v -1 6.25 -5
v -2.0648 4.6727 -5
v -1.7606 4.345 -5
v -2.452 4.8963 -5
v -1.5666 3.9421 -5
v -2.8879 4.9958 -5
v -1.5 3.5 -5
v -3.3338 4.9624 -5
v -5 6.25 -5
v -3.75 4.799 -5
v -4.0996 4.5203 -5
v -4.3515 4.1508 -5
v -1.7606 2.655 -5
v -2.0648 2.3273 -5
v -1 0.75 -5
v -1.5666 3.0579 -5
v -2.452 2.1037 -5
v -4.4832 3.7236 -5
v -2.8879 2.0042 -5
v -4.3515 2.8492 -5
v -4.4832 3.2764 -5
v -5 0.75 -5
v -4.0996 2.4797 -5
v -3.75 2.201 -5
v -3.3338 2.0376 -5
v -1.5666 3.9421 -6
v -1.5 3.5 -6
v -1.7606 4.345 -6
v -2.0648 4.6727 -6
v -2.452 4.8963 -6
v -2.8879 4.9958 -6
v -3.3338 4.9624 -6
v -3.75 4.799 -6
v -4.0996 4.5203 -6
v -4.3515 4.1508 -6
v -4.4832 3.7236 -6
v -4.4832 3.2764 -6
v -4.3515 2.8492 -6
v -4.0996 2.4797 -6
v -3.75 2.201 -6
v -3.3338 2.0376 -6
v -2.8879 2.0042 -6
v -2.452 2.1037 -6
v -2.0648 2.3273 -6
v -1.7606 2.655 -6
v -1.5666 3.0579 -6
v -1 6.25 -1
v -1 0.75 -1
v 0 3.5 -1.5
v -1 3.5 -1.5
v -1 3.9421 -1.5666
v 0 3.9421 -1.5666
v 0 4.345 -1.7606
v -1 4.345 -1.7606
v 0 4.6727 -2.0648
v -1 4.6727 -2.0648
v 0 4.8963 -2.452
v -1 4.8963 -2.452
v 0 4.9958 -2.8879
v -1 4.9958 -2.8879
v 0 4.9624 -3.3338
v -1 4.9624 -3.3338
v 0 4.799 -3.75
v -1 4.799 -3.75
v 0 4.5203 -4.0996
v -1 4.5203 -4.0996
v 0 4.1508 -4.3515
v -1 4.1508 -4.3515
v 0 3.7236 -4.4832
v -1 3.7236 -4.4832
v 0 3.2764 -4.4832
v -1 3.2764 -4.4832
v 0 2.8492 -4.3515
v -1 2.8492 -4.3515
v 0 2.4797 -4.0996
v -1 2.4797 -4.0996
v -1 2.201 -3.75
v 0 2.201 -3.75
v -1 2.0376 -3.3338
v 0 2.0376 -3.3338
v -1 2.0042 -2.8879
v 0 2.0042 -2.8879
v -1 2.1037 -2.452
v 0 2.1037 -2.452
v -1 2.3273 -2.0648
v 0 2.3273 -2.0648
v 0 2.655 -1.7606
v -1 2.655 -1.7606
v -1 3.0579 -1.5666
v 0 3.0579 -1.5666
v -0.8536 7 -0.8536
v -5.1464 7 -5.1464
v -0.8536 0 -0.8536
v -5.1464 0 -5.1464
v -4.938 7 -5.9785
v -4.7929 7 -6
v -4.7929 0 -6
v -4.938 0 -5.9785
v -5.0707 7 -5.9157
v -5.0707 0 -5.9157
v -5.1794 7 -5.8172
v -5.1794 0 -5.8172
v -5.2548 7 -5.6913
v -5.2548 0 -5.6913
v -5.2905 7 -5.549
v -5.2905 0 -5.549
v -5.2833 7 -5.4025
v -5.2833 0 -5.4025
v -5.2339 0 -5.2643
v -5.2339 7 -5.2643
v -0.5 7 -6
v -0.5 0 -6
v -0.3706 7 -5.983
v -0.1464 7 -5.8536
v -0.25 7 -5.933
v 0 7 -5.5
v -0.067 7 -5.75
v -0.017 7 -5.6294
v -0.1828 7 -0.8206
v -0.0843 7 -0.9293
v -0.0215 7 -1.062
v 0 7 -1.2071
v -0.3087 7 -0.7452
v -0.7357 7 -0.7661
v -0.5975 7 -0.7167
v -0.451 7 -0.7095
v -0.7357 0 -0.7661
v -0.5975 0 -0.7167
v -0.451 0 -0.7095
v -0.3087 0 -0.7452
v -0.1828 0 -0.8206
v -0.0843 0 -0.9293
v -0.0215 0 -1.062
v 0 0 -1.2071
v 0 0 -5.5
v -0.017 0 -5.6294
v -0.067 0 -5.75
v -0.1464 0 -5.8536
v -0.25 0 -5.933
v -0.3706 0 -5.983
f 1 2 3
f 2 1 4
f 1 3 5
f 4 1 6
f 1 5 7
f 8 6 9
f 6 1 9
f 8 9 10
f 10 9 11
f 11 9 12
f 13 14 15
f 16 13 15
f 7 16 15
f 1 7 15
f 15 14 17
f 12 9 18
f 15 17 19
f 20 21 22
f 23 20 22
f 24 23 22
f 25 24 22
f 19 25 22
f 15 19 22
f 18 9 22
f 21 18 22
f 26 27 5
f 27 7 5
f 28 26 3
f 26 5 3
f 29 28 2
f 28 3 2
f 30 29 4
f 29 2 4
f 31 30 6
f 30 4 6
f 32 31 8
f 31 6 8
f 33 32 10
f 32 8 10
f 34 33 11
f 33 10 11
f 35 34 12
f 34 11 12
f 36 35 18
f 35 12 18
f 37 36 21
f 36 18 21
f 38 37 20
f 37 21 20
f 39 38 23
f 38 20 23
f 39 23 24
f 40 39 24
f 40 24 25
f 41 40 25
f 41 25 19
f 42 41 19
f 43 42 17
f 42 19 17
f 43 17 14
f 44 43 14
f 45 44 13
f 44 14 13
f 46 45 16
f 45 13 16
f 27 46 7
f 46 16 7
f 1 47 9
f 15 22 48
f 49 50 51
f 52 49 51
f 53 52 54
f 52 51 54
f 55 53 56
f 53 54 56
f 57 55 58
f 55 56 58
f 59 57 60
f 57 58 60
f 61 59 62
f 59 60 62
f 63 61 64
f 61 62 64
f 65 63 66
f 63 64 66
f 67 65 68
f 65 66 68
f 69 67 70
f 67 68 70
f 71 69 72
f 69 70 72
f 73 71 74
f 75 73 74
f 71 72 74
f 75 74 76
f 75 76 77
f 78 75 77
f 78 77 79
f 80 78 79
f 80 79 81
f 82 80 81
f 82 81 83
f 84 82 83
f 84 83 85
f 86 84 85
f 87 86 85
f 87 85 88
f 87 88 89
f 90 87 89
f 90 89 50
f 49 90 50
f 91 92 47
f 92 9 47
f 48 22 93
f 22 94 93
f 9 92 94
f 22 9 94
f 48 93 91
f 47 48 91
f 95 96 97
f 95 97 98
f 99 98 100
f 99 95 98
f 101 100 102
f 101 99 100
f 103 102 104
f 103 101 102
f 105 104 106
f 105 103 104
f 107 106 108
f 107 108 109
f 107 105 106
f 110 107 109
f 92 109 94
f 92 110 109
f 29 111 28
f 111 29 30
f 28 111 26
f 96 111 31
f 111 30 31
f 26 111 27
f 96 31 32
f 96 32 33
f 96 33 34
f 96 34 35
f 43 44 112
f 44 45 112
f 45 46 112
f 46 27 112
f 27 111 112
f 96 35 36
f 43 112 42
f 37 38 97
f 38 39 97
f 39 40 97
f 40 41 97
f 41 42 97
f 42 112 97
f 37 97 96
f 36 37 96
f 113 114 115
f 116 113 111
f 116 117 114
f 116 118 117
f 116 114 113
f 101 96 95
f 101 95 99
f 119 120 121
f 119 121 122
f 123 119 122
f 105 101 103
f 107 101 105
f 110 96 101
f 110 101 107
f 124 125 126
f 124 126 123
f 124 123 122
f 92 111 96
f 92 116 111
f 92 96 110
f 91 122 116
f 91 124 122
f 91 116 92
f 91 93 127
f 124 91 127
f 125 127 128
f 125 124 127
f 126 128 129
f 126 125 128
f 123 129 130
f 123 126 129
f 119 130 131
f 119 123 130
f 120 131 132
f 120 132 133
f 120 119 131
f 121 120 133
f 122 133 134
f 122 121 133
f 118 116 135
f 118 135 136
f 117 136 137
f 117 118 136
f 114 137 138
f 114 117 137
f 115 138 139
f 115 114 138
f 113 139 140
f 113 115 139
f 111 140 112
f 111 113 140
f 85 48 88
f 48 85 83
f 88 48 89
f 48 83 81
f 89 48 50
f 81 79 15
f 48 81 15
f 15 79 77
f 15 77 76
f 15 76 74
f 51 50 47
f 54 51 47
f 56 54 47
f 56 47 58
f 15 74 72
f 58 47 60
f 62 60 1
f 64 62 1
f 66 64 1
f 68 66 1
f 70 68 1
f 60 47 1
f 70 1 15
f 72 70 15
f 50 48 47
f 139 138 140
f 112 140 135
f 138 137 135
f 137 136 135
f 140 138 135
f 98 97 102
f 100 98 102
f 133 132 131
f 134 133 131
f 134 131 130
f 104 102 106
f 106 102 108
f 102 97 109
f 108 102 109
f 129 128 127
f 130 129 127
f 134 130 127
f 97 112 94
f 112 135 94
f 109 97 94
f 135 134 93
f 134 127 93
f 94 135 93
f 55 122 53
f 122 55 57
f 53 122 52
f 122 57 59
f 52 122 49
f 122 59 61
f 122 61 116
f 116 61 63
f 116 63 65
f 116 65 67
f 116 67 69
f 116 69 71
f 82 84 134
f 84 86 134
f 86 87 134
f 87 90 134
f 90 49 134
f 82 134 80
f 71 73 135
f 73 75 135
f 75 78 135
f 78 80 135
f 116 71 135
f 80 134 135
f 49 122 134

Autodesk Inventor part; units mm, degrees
ref_plane "YZ Plane" through (0, 0, 0) normal (1, 0, 0) x (0, 1, 0)
ref_plane "XZ Plane" through (0, 0, 0) normal (0, 1, 0) x (-1, 0, 0)
ref_plane "XY Plane" through (0, 0, 0) normal (0, 0, 1) x (1, 0, 0)
sketch "Sketch1" plane through (0, 0, 0) normal (0, 1, 0) x (-1, 0, 0)
  line L0 (0, 0) -> (0, -6)
  line L1 (0, -6) -> (6, -6)
  line L2 (6, -6) -> (0, 0)
  dimension "d0" = 6
  dimension "d1" = 6
extrude "Extrusion1" add sketch "Sketch1" along normal blind 7
ref_plane "Work Plane1" through (-6, 0, 0) normal (1, 0, 0) x (0, 0, -1)
fillet "Fillet1" radius 0.5 1 edges at (0, 3.5, -6)
sketch "Sketch2" plane through (-6, 0, 0) normal (1, 0, 0) x (0, 0, -1)
  line L0 (0, 0) -> (0, 7) projected
  line L1 (0, 6.25) -> (5, 6.25)
  line L2 (5, 6.25) -> (5, 0.75)
  line L3 (5, 0.75) -> (0, 0.75)
  line L4 (0, 0.75) -> (0, 6.25)
  line L5 (6, 7) -> (0, 7) projected
  point P0 (0, 0.75)
  dimension "d6" = 5.5
  dimension "d7" = 5
  dimension "d8" = 0.75
extrude "Extrusion2" cut sketch "Sketch2" along normal blind 5
sketch "Sketch3" plane through (-1, 0, 0) normal (-1, 0, 0) x (0, 0, 1)
  circle A0 centre (-3, 3.5) radius 1.5
  line L0 (-6, 0) -> (0, 0) projected
  dimension "d11" = 3
  dimension "d12" = 3.5
  dimension "d13" = 3
extrude "Extrusion3" cut sketch "Sketch3" against normal blind 5
sketch "Sketch4" plane through (-5, 0.75, -5) normal (0, 0, 1) x (1, 0, 0)
  circle A0 centre (2, 2.75) radius 1.5
  line L0 (-1, 7.65) -> (-1, -2.15) projected
  line L1 (-1, -0.75) -> (5, -0.75) projected
  dimension "d16" = 3
  dimension "d17" = 3
  dimension "d18" = 3.5
extrude "Extrusion4" cut sketch "Sketch4" against normal blind 5
fillet "Fillet2" radius 0.5 1 edges at (-6, 3.5, -6)
fillet "Fillet3" radius 0.5 1 edges at (0, 3.5, 0)
properties part number "bracket"
